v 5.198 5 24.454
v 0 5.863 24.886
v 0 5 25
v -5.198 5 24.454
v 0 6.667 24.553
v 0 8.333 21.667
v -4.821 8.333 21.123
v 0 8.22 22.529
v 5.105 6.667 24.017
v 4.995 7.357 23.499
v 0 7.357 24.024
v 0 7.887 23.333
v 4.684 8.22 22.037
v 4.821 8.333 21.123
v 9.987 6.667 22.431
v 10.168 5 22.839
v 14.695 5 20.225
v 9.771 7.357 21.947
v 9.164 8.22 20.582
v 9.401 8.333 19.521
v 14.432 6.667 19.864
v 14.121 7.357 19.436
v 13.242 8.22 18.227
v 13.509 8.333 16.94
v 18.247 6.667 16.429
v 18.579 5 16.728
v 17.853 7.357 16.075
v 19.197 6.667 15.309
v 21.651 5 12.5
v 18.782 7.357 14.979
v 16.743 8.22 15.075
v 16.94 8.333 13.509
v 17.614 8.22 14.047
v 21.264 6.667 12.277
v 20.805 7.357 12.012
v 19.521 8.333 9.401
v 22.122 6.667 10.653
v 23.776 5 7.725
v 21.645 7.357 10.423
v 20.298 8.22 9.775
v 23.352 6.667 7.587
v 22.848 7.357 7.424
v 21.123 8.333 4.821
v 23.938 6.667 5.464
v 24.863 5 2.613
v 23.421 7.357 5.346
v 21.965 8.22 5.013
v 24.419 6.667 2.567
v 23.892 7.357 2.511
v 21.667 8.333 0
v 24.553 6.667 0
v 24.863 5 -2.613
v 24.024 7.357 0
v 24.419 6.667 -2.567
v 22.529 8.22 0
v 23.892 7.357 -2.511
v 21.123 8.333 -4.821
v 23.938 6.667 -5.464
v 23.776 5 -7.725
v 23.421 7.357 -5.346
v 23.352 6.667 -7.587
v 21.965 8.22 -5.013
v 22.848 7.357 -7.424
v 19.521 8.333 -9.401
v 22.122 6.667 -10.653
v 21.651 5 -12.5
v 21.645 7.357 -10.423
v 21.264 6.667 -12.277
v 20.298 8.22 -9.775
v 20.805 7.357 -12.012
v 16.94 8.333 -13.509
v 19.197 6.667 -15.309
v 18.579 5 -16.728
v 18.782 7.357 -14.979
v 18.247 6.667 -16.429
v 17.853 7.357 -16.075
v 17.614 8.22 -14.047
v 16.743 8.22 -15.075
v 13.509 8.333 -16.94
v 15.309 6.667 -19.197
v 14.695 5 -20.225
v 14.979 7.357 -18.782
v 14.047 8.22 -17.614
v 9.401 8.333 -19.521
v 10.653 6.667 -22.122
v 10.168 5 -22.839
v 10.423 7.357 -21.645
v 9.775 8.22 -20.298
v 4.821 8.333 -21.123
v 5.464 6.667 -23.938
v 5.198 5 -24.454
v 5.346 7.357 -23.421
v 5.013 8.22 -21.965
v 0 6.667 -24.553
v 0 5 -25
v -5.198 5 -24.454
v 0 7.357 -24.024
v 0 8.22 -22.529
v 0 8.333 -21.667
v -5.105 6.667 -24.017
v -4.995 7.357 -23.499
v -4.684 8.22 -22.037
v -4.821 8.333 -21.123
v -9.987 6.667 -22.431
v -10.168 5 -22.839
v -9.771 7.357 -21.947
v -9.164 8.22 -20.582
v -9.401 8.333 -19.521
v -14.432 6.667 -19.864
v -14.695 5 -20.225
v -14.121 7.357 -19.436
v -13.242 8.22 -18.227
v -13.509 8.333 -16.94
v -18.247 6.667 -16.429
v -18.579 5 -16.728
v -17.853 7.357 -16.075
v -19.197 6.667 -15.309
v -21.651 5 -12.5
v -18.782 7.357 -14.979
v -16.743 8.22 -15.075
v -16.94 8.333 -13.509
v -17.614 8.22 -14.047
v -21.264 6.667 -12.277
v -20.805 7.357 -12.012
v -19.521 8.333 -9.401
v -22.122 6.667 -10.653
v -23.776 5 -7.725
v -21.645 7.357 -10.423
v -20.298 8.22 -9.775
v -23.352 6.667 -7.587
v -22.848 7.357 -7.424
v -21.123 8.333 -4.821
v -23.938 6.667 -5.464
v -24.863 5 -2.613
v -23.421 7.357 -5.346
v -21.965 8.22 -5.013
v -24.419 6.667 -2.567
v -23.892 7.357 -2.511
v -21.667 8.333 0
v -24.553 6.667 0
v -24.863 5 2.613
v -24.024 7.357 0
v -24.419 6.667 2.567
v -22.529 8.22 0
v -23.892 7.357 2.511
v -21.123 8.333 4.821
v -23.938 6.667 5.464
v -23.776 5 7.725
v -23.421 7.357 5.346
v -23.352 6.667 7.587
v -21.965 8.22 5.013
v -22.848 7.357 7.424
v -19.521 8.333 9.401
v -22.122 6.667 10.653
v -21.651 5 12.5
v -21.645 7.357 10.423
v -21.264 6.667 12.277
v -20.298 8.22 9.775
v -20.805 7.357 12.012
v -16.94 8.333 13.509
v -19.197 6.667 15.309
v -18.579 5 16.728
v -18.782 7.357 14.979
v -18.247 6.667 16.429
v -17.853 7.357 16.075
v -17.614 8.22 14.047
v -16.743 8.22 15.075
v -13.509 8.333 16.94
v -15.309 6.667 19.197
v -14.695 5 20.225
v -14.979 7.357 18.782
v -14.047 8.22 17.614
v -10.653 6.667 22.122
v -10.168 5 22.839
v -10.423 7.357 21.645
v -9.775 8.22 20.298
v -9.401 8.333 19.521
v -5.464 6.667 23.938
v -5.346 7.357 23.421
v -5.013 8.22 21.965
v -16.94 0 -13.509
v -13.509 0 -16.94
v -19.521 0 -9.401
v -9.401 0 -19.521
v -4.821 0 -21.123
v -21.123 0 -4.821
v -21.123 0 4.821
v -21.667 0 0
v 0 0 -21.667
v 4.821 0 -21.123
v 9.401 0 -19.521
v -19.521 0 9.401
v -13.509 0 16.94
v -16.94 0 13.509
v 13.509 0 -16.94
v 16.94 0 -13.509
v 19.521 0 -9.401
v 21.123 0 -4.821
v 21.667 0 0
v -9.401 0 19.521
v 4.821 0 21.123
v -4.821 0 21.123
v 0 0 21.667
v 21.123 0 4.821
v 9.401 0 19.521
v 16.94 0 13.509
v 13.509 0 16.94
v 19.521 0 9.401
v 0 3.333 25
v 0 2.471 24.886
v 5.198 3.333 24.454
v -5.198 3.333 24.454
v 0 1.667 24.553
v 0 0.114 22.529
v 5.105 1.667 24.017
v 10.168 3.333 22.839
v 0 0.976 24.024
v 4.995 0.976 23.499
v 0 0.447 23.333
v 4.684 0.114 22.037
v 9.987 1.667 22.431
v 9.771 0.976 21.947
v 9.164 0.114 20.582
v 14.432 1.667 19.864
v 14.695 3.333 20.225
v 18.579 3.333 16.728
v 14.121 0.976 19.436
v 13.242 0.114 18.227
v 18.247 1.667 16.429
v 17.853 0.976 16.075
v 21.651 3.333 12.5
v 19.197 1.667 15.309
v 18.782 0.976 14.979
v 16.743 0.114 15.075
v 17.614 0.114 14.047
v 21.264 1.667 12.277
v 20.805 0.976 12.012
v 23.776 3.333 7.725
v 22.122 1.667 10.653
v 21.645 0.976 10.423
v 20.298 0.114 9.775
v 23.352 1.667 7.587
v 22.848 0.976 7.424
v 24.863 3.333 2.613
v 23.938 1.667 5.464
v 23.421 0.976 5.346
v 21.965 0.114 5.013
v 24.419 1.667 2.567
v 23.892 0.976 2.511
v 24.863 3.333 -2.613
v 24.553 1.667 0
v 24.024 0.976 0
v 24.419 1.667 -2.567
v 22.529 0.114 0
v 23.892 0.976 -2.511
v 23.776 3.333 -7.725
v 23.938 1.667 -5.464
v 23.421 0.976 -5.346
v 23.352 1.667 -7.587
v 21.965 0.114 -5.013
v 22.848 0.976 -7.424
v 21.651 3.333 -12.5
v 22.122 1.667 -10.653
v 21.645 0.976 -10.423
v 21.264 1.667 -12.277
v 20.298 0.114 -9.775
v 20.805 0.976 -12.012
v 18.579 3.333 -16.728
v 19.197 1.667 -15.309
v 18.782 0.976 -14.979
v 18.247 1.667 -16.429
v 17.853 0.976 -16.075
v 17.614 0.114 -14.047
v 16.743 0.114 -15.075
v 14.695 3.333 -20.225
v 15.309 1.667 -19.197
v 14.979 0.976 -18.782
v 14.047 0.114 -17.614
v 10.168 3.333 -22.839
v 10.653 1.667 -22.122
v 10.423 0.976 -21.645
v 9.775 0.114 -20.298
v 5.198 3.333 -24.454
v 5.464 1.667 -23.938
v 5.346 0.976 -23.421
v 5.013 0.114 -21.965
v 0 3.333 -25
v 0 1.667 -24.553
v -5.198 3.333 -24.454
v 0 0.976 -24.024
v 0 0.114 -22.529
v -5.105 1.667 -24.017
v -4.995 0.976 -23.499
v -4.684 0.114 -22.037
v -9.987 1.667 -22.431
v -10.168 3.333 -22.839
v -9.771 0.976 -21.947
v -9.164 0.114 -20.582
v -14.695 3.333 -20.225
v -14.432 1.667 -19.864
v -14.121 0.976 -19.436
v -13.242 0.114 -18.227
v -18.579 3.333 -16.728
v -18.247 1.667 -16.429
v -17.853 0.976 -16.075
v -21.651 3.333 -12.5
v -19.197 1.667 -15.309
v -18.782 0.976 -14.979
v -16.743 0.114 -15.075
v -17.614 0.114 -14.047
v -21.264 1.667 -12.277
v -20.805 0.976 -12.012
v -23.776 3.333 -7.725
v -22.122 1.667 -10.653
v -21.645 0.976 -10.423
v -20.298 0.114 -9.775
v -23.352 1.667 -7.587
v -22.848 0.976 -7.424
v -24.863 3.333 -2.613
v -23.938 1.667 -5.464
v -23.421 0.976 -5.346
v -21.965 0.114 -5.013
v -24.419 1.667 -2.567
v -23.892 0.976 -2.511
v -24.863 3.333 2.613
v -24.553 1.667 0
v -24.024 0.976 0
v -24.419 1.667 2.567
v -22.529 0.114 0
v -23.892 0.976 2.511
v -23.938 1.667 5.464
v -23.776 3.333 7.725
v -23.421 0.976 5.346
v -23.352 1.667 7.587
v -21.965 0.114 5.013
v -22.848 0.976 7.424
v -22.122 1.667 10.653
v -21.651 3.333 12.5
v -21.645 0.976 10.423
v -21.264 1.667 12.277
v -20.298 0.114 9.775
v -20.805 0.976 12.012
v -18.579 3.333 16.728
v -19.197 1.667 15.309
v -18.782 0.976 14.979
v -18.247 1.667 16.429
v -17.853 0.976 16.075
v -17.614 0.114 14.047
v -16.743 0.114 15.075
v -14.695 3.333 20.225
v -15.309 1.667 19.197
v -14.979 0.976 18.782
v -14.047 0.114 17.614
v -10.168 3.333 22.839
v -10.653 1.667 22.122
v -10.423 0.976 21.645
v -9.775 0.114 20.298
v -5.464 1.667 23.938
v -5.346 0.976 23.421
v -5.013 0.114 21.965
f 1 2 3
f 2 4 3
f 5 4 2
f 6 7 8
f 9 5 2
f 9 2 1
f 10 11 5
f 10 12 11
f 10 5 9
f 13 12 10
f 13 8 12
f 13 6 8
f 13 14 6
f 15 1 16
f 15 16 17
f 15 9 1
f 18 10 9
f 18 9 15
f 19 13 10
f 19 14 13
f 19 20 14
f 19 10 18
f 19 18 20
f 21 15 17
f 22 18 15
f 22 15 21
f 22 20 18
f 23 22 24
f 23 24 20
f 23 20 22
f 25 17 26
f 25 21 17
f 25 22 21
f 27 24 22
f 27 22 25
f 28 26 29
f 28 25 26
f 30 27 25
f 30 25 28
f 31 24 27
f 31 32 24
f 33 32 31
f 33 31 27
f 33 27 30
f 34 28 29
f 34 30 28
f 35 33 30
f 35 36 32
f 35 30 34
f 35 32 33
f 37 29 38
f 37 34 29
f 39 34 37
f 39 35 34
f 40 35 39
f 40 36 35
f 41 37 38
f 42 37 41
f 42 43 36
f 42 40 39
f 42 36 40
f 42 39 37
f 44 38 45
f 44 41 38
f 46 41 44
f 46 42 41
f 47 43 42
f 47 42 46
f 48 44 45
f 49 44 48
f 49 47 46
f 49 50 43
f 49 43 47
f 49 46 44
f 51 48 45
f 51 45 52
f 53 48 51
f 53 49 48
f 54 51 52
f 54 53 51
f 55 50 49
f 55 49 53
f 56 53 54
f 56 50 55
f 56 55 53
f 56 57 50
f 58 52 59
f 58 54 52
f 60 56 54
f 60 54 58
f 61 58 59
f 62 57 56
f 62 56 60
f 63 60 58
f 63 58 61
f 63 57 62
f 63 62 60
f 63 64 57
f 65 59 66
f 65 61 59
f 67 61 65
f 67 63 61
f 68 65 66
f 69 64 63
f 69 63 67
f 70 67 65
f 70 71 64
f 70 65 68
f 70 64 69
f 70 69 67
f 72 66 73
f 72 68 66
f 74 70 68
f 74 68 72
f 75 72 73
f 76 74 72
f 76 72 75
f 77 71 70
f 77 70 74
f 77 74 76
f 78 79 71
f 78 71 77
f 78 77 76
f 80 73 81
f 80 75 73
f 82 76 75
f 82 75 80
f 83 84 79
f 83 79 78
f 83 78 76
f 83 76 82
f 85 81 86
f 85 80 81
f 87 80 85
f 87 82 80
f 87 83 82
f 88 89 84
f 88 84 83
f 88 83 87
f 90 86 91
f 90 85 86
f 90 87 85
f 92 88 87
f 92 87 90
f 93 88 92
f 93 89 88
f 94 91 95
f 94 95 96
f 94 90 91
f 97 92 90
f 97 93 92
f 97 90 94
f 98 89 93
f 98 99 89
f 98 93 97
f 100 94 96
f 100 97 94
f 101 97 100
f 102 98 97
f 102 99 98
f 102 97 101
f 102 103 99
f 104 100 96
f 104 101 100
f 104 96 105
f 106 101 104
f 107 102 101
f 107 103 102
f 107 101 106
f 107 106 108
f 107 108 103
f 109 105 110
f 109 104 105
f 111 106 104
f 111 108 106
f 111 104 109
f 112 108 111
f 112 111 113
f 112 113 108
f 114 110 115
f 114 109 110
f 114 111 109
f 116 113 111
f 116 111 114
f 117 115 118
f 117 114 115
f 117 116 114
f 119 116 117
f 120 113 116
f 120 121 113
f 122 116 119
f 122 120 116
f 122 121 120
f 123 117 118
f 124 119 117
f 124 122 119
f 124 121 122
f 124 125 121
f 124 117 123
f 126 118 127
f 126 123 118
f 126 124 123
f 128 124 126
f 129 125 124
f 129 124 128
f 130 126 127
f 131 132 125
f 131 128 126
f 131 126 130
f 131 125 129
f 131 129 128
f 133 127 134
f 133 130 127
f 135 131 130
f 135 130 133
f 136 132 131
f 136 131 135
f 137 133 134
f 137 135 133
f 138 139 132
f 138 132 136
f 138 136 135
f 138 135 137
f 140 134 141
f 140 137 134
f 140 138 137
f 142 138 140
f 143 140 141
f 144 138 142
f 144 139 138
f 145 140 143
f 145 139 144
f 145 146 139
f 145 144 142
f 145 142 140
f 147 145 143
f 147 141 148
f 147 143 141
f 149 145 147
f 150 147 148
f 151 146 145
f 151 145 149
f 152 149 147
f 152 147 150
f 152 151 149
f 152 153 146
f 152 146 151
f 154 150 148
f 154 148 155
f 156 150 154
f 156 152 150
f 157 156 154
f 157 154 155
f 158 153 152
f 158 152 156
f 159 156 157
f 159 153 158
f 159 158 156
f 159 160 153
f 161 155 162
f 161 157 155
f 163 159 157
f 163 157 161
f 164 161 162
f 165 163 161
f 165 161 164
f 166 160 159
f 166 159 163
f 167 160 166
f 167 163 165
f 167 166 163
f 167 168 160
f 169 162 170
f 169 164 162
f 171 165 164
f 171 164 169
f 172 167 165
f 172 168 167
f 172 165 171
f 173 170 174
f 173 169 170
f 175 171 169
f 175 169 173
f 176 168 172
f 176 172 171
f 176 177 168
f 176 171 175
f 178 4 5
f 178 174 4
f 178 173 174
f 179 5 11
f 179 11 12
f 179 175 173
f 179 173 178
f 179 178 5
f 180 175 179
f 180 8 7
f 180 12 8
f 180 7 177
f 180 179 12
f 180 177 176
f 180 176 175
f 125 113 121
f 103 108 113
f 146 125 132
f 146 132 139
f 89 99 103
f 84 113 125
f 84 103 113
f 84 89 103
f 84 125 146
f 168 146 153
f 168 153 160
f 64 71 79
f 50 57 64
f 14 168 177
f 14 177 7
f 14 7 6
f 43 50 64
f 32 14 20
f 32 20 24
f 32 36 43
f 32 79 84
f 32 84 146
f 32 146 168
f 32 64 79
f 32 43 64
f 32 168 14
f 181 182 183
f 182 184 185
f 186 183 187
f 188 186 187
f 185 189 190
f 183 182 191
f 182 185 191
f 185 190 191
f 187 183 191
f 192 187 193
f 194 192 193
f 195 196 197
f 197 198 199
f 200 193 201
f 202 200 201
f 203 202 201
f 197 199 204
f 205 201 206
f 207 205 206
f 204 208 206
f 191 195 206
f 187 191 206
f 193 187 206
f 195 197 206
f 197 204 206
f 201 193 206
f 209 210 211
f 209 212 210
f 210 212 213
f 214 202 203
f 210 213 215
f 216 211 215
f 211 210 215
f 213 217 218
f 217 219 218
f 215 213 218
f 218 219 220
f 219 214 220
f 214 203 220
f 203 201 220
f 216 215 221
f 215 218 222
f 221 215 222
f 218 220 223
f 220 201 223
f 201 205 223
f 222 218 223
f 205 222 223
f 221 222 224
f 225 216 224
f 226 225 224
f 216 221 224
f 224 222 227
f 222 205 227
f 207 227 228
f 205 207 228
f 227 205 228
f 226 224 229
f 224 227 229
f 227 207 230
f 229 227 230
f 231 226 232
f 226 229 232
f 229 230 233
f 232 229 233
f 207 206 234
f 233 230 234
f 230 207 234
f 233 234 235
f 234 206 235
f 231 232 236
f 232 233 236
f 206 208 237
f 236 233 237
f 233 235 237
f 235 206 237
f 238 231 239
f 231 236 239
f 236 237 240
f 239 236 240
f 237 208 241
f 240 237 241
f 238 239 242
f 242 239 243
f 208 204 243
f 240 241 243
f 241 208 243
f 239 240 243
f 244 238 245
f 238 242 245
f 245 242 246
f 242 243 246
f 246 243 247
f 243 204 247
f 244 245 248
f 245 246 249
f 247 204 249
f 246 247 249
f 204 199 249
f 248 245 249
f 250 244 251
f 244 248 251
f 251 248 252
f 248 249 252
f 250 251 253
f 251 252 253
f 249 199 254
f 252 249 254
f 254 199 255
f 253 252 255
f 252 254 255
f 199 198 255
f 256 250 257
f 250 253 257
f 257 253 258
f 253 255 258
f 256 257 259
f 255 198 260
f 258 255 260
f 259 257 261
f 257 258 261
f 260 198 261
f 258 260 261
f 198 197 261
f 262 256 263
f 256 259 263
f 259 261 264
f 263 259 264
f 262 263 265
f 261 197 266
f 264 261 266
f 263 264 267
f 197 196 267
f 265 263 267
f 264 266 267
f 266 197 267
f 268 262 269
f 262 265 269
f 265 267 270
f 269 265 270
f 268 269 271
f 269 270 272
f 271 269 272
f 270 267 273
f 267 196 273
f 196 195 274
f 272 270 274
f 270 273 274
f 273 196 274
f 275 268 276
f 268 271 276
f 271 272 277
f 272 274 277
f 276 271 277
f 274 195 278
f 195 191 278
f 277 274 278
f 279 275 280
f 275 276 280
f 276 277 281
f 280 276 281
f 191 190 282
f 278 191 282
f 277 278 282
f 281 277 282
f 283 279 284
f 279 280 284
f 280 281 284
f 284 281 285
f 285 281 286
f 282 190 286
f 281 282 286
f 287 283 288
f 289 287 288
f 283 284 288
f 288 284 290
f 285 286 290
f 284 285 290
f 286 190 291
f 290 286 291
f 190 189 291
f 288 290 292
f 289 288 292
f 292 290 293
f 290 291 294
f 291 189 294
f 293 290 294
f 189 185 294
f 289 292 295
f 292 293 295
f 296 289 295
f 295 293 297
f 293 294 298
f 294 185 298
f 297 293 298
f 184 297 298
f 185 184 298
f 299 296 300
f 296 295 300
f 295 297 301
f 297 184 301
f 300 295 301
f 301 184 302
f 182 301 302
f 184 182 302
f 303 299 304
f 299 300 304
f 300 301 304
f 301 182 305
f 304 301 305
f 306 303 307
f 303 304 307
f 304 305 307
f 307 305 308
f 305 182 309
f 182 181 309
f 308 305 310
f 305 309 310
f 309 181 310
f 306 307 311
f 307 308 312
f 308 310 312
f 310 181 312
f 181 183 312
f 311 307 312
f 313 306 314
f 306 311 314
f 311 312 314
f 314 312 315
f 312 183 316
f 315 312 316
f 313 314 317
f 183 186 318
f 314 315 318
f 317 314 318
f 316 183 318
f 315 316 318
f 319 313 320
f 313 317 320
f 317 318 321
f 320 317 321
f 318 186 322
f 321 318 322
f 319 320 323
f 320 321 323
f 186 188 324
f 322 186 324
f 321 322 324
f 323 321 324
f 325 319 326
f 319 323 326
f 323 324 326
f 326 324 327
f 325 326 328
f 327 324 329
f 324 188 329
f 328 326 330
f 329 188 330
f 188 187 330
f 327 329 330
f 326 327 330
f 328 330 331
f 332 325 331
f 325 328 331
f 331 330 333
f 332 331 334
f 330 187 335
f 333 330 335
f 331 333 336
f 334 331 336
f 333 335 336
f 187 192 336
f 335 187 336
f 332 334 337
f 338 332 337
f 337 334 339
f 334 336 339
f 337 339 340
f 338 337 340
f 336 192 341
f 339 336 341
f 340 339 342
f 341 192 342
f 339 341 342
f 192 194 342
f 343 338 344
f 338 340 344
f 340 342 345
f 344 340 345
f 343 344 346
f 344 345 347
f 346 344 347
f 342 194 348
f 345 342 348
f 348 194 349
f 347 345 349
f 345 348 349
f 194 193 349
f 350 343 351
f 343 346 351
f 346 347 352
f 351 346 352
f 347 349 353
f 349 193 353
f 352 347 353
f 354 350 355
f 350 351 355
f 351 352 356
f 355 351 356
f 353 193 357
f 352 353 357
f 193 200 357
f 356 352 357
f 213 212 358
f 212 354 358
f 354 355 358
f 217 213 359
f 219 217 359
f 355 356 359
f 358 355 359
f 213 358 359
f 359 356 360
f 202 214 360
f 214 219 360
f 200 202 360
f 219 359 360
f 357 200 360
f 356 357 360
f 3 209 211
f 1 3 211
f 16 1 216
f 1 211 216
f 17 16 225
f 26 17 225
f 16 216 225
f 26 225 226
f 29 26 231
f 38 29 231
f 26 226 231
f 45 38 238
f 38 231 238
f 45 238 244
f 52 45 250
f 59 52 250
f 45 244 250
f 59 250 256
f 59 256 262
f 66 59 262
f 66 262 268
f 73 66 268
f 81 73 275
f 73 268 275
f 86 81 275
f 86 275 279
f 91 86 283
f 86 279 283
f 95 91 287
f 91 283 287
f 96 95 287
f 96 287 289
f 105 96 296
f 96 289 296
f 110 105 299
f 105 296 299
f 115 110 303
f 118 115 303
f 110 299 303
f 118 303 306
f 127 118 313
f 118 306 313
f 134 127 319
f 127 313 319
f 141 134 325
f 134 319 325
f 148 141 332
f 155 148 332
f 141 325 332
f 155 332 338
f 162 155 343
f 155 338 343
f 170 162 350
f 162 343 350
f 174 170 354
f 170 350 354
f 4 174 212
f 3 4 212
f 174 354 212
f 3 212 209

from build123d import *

# Parameters (mm, degrees)
SKETCH2_R           = 75
BOSS_EXTRUDE1_DEPTH = 25
FILLET1_R           = 10
SCALE1_SCALE        = 0.333333333


with BuildPart() as part:
    # Sketch2 → Boss-Extrude1 (new body)
    with BuildSketch(Plane(origin=(0, 0, 0), x_dir=(1, 0, 0), z_dir=(0, 1, 0))):
        with Locations(Location((0, 0, 0), (0, 0, 270))):
            Circle(SKETCH2_R)
    extrude(amount=BOSS_EXTRUDE1_DEPTH)

    # Fillet1
    fillet1_edges = [part.edges().sort_by_distance(p)[0] for p in [
        (0, 0, -75),
        (0, 25, -75),
    ]]
    fillet(fillet1_edges, radius=FILLET1_R)


with BuildPart() as part_1:
    # Scale1: scaled about (0, 0, 0)
    add(part.part.scale(SCALE1_SCALE))


solid = part_1.part
